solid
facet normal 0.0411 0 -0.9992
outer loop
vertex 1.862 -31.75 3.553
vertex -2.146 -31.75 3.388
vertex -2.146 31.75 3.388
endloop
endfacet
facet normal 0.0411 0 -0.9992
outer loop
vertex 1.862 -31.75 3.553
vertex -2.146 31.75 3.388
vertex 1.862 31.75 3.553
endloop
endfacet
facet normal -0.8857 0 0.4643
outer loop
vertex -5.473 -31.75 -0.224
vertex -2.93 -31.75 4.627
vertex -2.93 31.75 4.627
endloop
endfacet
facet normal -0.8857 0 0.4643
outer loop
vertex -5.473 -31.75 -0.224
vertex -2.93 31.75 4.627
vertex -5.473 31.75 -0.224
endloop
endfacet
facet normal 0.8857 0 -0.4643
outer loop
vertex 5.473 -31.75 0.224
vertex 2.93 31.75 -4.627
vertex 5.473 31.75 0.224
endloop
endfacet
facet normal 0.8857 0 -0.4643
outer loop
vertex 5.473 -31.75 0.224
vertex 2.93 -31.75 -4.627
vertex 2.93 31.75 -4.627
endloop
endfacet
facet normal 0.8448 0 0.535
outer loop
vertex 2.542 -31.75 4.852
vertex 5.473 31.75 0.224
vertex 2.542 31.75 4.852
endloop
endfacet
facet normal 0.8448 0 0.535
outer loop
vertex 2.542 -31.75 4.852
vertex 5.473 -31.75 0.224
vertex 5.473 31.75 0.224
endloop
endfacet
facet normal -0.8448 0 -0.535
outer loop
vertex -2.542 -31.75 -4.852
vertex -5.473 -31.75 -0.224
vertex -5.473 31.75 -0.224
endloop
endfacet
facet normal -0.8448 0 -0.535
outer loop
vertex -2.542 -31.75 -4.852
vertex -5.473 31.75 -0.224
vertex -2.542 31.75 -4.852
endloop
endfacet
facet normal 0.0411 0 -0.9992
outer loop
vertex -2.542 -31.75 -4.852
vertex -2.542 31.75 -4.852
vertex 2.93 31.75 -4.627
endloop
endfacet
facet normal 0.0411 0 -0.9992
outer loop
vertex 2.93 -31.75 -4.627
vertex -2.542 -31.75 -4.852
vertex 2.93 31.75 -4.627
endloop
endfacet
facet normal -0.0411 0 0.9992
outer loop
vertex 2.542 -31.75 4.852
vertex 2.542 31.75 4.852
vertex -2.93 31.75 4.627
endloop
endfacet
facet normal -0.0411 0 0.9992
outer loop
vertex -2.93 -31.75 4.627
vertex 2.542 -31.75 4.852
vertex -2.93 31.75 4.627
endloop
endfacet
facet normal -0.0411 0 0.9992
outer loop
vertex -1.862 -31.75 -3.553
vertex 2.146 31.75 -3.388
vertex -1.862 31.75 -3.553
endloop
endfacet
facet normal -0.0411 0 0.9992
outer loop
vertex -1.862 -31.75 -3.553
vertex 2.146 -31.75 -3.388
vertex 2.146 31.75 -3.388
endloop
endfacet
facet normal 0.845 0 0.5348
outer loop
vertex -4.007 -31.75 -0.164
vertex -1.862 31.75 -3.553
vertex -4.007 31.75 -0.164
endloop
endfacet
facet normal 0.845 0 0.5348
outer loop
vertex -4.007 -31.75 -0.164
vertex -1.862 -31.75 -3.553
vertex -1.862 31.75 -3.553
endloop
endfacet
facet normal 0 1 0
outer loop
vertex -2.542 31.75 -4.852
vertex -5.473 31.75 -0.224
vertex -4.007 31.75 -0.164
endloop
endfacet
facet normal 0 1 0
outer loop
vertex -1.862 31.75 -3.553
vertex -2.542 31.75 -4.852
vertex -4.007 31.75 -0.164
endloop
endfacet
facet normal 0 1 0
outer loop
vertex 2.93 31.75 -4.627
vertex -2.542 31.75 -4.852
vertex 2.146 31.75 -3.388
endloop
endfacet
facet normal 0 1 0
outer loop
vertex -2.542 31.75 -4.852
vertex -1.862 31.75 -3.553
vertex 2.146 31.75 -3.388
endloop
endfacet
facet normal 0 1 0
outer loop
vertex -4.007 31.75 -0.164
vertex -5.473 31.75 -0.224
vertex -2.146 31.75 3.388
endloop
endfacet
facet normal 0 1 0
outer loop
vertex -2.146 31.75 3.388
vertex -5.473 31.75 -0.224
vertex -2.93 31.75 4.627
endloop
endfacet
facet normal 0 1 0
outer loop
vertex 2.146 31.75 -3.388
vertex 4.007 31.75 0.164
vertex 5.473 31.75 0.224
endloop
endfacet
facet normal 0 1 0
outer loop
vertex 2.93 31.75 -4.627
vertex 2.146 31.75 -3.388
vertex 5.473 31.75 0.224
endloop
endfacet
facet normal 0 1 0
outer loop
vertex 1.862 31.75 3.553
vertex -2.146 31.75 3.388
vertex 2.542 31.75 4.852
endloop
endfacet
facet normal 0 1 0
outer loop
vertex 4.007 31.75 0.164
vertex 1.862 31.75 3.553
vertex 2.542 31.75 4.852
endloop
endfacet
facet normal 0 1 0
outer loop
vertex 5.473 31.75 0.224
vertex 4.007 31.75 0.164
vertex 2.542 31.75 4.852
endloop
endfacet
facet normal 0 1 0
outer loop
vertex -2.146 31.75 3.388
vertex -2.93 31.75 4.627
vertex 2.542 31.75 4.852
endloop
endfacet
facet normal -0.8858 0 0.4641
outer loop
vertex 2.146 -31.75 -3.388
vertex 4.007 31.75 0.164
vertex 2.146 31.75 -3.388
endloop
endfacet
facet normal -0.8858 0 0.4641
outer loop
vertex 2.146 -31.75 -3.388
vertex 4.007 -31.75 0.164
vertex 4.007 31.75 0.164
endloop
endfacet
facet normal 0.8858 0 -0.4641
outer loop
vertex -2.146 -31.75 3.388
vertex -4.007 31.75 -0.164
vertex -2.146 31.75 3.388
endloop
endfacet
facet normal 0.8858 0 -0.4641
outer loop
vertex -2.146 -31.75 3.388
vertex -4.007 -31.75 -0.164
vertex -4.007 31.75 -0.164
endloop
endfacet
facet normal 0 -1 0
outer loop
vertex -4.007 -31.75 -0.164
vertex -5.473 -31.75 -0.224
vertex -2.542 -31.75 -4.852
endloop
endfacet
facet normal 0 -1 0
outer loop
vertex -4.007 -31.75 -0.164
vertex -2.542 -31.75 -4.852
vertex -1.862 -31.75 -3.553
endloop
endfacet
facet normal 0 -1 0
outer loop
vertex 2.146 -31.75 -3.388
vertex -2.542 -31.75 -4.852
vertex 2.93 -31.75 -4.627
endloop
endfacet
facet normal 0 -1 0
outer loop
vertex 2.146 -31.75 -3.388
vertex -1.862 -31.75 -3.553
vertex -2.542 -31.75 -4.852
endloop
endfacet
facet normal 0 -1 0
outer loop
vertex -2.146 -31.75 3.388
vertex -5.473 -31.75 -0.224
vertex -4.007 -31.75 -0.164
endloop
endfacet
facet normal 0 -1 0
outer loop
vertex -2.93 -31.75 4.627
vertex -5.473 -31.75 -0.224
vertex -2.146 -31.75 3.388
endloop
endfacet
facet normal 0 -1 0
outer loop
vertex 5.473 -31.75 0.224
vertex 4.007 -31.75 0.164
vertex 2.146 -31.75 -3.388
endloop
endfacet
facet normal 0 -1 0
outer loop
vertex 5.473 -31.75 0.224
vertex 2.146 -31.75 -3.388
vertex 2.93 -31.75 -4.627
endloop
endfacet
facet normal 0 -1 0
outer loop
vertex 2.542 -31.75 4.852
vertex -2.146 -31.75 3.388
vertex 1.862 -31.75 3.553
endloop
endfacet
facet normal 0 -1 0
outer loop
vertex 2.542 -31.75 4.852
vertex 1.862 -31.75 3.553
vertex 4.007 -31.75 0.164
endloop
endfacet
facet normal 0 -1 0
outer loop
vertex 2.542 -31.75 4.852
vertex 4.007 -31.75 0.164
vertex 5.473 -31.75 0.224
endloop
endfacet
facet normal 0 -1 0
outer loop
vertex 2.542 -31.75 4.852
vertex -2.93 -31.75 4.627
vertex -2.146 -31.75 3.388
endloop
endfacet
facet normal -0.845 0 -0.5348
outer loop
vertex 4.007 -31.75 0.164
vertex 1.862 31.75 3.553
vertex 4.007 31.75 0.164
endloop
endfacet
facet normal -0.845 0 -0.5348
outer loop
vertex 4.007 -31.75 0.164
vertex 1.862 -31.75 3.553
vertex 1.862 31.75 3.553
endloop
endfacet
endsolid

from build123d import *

# Parameters (mm, degrees)
F1_DEPTH = 31.75


with BuildPart() as f1:
    # F0 (on Front) → F1 (new body, symmetric)
    with BuildSketch(Plane.XZ):
        Polygon((5.472675, 0.224179), (2.542193, 4.851565), (-2.930482, 4.627386), (-5.472675, -0.224179), (-2.542193, -4.851565), (2.930482, -4.627386), align=None)
        Polygon((-2.145882, 3.388461), (1.861552, 3.552618), (4.007434, 0.164158), (2.145882, -3.388461), (-1.861552, -3.552618), (-4.007434, -0.164158), align=None, mode=Mode.SUBTRACT)
    extrude(amount=F1_DEPTH, both=True)


solid = f1.part
